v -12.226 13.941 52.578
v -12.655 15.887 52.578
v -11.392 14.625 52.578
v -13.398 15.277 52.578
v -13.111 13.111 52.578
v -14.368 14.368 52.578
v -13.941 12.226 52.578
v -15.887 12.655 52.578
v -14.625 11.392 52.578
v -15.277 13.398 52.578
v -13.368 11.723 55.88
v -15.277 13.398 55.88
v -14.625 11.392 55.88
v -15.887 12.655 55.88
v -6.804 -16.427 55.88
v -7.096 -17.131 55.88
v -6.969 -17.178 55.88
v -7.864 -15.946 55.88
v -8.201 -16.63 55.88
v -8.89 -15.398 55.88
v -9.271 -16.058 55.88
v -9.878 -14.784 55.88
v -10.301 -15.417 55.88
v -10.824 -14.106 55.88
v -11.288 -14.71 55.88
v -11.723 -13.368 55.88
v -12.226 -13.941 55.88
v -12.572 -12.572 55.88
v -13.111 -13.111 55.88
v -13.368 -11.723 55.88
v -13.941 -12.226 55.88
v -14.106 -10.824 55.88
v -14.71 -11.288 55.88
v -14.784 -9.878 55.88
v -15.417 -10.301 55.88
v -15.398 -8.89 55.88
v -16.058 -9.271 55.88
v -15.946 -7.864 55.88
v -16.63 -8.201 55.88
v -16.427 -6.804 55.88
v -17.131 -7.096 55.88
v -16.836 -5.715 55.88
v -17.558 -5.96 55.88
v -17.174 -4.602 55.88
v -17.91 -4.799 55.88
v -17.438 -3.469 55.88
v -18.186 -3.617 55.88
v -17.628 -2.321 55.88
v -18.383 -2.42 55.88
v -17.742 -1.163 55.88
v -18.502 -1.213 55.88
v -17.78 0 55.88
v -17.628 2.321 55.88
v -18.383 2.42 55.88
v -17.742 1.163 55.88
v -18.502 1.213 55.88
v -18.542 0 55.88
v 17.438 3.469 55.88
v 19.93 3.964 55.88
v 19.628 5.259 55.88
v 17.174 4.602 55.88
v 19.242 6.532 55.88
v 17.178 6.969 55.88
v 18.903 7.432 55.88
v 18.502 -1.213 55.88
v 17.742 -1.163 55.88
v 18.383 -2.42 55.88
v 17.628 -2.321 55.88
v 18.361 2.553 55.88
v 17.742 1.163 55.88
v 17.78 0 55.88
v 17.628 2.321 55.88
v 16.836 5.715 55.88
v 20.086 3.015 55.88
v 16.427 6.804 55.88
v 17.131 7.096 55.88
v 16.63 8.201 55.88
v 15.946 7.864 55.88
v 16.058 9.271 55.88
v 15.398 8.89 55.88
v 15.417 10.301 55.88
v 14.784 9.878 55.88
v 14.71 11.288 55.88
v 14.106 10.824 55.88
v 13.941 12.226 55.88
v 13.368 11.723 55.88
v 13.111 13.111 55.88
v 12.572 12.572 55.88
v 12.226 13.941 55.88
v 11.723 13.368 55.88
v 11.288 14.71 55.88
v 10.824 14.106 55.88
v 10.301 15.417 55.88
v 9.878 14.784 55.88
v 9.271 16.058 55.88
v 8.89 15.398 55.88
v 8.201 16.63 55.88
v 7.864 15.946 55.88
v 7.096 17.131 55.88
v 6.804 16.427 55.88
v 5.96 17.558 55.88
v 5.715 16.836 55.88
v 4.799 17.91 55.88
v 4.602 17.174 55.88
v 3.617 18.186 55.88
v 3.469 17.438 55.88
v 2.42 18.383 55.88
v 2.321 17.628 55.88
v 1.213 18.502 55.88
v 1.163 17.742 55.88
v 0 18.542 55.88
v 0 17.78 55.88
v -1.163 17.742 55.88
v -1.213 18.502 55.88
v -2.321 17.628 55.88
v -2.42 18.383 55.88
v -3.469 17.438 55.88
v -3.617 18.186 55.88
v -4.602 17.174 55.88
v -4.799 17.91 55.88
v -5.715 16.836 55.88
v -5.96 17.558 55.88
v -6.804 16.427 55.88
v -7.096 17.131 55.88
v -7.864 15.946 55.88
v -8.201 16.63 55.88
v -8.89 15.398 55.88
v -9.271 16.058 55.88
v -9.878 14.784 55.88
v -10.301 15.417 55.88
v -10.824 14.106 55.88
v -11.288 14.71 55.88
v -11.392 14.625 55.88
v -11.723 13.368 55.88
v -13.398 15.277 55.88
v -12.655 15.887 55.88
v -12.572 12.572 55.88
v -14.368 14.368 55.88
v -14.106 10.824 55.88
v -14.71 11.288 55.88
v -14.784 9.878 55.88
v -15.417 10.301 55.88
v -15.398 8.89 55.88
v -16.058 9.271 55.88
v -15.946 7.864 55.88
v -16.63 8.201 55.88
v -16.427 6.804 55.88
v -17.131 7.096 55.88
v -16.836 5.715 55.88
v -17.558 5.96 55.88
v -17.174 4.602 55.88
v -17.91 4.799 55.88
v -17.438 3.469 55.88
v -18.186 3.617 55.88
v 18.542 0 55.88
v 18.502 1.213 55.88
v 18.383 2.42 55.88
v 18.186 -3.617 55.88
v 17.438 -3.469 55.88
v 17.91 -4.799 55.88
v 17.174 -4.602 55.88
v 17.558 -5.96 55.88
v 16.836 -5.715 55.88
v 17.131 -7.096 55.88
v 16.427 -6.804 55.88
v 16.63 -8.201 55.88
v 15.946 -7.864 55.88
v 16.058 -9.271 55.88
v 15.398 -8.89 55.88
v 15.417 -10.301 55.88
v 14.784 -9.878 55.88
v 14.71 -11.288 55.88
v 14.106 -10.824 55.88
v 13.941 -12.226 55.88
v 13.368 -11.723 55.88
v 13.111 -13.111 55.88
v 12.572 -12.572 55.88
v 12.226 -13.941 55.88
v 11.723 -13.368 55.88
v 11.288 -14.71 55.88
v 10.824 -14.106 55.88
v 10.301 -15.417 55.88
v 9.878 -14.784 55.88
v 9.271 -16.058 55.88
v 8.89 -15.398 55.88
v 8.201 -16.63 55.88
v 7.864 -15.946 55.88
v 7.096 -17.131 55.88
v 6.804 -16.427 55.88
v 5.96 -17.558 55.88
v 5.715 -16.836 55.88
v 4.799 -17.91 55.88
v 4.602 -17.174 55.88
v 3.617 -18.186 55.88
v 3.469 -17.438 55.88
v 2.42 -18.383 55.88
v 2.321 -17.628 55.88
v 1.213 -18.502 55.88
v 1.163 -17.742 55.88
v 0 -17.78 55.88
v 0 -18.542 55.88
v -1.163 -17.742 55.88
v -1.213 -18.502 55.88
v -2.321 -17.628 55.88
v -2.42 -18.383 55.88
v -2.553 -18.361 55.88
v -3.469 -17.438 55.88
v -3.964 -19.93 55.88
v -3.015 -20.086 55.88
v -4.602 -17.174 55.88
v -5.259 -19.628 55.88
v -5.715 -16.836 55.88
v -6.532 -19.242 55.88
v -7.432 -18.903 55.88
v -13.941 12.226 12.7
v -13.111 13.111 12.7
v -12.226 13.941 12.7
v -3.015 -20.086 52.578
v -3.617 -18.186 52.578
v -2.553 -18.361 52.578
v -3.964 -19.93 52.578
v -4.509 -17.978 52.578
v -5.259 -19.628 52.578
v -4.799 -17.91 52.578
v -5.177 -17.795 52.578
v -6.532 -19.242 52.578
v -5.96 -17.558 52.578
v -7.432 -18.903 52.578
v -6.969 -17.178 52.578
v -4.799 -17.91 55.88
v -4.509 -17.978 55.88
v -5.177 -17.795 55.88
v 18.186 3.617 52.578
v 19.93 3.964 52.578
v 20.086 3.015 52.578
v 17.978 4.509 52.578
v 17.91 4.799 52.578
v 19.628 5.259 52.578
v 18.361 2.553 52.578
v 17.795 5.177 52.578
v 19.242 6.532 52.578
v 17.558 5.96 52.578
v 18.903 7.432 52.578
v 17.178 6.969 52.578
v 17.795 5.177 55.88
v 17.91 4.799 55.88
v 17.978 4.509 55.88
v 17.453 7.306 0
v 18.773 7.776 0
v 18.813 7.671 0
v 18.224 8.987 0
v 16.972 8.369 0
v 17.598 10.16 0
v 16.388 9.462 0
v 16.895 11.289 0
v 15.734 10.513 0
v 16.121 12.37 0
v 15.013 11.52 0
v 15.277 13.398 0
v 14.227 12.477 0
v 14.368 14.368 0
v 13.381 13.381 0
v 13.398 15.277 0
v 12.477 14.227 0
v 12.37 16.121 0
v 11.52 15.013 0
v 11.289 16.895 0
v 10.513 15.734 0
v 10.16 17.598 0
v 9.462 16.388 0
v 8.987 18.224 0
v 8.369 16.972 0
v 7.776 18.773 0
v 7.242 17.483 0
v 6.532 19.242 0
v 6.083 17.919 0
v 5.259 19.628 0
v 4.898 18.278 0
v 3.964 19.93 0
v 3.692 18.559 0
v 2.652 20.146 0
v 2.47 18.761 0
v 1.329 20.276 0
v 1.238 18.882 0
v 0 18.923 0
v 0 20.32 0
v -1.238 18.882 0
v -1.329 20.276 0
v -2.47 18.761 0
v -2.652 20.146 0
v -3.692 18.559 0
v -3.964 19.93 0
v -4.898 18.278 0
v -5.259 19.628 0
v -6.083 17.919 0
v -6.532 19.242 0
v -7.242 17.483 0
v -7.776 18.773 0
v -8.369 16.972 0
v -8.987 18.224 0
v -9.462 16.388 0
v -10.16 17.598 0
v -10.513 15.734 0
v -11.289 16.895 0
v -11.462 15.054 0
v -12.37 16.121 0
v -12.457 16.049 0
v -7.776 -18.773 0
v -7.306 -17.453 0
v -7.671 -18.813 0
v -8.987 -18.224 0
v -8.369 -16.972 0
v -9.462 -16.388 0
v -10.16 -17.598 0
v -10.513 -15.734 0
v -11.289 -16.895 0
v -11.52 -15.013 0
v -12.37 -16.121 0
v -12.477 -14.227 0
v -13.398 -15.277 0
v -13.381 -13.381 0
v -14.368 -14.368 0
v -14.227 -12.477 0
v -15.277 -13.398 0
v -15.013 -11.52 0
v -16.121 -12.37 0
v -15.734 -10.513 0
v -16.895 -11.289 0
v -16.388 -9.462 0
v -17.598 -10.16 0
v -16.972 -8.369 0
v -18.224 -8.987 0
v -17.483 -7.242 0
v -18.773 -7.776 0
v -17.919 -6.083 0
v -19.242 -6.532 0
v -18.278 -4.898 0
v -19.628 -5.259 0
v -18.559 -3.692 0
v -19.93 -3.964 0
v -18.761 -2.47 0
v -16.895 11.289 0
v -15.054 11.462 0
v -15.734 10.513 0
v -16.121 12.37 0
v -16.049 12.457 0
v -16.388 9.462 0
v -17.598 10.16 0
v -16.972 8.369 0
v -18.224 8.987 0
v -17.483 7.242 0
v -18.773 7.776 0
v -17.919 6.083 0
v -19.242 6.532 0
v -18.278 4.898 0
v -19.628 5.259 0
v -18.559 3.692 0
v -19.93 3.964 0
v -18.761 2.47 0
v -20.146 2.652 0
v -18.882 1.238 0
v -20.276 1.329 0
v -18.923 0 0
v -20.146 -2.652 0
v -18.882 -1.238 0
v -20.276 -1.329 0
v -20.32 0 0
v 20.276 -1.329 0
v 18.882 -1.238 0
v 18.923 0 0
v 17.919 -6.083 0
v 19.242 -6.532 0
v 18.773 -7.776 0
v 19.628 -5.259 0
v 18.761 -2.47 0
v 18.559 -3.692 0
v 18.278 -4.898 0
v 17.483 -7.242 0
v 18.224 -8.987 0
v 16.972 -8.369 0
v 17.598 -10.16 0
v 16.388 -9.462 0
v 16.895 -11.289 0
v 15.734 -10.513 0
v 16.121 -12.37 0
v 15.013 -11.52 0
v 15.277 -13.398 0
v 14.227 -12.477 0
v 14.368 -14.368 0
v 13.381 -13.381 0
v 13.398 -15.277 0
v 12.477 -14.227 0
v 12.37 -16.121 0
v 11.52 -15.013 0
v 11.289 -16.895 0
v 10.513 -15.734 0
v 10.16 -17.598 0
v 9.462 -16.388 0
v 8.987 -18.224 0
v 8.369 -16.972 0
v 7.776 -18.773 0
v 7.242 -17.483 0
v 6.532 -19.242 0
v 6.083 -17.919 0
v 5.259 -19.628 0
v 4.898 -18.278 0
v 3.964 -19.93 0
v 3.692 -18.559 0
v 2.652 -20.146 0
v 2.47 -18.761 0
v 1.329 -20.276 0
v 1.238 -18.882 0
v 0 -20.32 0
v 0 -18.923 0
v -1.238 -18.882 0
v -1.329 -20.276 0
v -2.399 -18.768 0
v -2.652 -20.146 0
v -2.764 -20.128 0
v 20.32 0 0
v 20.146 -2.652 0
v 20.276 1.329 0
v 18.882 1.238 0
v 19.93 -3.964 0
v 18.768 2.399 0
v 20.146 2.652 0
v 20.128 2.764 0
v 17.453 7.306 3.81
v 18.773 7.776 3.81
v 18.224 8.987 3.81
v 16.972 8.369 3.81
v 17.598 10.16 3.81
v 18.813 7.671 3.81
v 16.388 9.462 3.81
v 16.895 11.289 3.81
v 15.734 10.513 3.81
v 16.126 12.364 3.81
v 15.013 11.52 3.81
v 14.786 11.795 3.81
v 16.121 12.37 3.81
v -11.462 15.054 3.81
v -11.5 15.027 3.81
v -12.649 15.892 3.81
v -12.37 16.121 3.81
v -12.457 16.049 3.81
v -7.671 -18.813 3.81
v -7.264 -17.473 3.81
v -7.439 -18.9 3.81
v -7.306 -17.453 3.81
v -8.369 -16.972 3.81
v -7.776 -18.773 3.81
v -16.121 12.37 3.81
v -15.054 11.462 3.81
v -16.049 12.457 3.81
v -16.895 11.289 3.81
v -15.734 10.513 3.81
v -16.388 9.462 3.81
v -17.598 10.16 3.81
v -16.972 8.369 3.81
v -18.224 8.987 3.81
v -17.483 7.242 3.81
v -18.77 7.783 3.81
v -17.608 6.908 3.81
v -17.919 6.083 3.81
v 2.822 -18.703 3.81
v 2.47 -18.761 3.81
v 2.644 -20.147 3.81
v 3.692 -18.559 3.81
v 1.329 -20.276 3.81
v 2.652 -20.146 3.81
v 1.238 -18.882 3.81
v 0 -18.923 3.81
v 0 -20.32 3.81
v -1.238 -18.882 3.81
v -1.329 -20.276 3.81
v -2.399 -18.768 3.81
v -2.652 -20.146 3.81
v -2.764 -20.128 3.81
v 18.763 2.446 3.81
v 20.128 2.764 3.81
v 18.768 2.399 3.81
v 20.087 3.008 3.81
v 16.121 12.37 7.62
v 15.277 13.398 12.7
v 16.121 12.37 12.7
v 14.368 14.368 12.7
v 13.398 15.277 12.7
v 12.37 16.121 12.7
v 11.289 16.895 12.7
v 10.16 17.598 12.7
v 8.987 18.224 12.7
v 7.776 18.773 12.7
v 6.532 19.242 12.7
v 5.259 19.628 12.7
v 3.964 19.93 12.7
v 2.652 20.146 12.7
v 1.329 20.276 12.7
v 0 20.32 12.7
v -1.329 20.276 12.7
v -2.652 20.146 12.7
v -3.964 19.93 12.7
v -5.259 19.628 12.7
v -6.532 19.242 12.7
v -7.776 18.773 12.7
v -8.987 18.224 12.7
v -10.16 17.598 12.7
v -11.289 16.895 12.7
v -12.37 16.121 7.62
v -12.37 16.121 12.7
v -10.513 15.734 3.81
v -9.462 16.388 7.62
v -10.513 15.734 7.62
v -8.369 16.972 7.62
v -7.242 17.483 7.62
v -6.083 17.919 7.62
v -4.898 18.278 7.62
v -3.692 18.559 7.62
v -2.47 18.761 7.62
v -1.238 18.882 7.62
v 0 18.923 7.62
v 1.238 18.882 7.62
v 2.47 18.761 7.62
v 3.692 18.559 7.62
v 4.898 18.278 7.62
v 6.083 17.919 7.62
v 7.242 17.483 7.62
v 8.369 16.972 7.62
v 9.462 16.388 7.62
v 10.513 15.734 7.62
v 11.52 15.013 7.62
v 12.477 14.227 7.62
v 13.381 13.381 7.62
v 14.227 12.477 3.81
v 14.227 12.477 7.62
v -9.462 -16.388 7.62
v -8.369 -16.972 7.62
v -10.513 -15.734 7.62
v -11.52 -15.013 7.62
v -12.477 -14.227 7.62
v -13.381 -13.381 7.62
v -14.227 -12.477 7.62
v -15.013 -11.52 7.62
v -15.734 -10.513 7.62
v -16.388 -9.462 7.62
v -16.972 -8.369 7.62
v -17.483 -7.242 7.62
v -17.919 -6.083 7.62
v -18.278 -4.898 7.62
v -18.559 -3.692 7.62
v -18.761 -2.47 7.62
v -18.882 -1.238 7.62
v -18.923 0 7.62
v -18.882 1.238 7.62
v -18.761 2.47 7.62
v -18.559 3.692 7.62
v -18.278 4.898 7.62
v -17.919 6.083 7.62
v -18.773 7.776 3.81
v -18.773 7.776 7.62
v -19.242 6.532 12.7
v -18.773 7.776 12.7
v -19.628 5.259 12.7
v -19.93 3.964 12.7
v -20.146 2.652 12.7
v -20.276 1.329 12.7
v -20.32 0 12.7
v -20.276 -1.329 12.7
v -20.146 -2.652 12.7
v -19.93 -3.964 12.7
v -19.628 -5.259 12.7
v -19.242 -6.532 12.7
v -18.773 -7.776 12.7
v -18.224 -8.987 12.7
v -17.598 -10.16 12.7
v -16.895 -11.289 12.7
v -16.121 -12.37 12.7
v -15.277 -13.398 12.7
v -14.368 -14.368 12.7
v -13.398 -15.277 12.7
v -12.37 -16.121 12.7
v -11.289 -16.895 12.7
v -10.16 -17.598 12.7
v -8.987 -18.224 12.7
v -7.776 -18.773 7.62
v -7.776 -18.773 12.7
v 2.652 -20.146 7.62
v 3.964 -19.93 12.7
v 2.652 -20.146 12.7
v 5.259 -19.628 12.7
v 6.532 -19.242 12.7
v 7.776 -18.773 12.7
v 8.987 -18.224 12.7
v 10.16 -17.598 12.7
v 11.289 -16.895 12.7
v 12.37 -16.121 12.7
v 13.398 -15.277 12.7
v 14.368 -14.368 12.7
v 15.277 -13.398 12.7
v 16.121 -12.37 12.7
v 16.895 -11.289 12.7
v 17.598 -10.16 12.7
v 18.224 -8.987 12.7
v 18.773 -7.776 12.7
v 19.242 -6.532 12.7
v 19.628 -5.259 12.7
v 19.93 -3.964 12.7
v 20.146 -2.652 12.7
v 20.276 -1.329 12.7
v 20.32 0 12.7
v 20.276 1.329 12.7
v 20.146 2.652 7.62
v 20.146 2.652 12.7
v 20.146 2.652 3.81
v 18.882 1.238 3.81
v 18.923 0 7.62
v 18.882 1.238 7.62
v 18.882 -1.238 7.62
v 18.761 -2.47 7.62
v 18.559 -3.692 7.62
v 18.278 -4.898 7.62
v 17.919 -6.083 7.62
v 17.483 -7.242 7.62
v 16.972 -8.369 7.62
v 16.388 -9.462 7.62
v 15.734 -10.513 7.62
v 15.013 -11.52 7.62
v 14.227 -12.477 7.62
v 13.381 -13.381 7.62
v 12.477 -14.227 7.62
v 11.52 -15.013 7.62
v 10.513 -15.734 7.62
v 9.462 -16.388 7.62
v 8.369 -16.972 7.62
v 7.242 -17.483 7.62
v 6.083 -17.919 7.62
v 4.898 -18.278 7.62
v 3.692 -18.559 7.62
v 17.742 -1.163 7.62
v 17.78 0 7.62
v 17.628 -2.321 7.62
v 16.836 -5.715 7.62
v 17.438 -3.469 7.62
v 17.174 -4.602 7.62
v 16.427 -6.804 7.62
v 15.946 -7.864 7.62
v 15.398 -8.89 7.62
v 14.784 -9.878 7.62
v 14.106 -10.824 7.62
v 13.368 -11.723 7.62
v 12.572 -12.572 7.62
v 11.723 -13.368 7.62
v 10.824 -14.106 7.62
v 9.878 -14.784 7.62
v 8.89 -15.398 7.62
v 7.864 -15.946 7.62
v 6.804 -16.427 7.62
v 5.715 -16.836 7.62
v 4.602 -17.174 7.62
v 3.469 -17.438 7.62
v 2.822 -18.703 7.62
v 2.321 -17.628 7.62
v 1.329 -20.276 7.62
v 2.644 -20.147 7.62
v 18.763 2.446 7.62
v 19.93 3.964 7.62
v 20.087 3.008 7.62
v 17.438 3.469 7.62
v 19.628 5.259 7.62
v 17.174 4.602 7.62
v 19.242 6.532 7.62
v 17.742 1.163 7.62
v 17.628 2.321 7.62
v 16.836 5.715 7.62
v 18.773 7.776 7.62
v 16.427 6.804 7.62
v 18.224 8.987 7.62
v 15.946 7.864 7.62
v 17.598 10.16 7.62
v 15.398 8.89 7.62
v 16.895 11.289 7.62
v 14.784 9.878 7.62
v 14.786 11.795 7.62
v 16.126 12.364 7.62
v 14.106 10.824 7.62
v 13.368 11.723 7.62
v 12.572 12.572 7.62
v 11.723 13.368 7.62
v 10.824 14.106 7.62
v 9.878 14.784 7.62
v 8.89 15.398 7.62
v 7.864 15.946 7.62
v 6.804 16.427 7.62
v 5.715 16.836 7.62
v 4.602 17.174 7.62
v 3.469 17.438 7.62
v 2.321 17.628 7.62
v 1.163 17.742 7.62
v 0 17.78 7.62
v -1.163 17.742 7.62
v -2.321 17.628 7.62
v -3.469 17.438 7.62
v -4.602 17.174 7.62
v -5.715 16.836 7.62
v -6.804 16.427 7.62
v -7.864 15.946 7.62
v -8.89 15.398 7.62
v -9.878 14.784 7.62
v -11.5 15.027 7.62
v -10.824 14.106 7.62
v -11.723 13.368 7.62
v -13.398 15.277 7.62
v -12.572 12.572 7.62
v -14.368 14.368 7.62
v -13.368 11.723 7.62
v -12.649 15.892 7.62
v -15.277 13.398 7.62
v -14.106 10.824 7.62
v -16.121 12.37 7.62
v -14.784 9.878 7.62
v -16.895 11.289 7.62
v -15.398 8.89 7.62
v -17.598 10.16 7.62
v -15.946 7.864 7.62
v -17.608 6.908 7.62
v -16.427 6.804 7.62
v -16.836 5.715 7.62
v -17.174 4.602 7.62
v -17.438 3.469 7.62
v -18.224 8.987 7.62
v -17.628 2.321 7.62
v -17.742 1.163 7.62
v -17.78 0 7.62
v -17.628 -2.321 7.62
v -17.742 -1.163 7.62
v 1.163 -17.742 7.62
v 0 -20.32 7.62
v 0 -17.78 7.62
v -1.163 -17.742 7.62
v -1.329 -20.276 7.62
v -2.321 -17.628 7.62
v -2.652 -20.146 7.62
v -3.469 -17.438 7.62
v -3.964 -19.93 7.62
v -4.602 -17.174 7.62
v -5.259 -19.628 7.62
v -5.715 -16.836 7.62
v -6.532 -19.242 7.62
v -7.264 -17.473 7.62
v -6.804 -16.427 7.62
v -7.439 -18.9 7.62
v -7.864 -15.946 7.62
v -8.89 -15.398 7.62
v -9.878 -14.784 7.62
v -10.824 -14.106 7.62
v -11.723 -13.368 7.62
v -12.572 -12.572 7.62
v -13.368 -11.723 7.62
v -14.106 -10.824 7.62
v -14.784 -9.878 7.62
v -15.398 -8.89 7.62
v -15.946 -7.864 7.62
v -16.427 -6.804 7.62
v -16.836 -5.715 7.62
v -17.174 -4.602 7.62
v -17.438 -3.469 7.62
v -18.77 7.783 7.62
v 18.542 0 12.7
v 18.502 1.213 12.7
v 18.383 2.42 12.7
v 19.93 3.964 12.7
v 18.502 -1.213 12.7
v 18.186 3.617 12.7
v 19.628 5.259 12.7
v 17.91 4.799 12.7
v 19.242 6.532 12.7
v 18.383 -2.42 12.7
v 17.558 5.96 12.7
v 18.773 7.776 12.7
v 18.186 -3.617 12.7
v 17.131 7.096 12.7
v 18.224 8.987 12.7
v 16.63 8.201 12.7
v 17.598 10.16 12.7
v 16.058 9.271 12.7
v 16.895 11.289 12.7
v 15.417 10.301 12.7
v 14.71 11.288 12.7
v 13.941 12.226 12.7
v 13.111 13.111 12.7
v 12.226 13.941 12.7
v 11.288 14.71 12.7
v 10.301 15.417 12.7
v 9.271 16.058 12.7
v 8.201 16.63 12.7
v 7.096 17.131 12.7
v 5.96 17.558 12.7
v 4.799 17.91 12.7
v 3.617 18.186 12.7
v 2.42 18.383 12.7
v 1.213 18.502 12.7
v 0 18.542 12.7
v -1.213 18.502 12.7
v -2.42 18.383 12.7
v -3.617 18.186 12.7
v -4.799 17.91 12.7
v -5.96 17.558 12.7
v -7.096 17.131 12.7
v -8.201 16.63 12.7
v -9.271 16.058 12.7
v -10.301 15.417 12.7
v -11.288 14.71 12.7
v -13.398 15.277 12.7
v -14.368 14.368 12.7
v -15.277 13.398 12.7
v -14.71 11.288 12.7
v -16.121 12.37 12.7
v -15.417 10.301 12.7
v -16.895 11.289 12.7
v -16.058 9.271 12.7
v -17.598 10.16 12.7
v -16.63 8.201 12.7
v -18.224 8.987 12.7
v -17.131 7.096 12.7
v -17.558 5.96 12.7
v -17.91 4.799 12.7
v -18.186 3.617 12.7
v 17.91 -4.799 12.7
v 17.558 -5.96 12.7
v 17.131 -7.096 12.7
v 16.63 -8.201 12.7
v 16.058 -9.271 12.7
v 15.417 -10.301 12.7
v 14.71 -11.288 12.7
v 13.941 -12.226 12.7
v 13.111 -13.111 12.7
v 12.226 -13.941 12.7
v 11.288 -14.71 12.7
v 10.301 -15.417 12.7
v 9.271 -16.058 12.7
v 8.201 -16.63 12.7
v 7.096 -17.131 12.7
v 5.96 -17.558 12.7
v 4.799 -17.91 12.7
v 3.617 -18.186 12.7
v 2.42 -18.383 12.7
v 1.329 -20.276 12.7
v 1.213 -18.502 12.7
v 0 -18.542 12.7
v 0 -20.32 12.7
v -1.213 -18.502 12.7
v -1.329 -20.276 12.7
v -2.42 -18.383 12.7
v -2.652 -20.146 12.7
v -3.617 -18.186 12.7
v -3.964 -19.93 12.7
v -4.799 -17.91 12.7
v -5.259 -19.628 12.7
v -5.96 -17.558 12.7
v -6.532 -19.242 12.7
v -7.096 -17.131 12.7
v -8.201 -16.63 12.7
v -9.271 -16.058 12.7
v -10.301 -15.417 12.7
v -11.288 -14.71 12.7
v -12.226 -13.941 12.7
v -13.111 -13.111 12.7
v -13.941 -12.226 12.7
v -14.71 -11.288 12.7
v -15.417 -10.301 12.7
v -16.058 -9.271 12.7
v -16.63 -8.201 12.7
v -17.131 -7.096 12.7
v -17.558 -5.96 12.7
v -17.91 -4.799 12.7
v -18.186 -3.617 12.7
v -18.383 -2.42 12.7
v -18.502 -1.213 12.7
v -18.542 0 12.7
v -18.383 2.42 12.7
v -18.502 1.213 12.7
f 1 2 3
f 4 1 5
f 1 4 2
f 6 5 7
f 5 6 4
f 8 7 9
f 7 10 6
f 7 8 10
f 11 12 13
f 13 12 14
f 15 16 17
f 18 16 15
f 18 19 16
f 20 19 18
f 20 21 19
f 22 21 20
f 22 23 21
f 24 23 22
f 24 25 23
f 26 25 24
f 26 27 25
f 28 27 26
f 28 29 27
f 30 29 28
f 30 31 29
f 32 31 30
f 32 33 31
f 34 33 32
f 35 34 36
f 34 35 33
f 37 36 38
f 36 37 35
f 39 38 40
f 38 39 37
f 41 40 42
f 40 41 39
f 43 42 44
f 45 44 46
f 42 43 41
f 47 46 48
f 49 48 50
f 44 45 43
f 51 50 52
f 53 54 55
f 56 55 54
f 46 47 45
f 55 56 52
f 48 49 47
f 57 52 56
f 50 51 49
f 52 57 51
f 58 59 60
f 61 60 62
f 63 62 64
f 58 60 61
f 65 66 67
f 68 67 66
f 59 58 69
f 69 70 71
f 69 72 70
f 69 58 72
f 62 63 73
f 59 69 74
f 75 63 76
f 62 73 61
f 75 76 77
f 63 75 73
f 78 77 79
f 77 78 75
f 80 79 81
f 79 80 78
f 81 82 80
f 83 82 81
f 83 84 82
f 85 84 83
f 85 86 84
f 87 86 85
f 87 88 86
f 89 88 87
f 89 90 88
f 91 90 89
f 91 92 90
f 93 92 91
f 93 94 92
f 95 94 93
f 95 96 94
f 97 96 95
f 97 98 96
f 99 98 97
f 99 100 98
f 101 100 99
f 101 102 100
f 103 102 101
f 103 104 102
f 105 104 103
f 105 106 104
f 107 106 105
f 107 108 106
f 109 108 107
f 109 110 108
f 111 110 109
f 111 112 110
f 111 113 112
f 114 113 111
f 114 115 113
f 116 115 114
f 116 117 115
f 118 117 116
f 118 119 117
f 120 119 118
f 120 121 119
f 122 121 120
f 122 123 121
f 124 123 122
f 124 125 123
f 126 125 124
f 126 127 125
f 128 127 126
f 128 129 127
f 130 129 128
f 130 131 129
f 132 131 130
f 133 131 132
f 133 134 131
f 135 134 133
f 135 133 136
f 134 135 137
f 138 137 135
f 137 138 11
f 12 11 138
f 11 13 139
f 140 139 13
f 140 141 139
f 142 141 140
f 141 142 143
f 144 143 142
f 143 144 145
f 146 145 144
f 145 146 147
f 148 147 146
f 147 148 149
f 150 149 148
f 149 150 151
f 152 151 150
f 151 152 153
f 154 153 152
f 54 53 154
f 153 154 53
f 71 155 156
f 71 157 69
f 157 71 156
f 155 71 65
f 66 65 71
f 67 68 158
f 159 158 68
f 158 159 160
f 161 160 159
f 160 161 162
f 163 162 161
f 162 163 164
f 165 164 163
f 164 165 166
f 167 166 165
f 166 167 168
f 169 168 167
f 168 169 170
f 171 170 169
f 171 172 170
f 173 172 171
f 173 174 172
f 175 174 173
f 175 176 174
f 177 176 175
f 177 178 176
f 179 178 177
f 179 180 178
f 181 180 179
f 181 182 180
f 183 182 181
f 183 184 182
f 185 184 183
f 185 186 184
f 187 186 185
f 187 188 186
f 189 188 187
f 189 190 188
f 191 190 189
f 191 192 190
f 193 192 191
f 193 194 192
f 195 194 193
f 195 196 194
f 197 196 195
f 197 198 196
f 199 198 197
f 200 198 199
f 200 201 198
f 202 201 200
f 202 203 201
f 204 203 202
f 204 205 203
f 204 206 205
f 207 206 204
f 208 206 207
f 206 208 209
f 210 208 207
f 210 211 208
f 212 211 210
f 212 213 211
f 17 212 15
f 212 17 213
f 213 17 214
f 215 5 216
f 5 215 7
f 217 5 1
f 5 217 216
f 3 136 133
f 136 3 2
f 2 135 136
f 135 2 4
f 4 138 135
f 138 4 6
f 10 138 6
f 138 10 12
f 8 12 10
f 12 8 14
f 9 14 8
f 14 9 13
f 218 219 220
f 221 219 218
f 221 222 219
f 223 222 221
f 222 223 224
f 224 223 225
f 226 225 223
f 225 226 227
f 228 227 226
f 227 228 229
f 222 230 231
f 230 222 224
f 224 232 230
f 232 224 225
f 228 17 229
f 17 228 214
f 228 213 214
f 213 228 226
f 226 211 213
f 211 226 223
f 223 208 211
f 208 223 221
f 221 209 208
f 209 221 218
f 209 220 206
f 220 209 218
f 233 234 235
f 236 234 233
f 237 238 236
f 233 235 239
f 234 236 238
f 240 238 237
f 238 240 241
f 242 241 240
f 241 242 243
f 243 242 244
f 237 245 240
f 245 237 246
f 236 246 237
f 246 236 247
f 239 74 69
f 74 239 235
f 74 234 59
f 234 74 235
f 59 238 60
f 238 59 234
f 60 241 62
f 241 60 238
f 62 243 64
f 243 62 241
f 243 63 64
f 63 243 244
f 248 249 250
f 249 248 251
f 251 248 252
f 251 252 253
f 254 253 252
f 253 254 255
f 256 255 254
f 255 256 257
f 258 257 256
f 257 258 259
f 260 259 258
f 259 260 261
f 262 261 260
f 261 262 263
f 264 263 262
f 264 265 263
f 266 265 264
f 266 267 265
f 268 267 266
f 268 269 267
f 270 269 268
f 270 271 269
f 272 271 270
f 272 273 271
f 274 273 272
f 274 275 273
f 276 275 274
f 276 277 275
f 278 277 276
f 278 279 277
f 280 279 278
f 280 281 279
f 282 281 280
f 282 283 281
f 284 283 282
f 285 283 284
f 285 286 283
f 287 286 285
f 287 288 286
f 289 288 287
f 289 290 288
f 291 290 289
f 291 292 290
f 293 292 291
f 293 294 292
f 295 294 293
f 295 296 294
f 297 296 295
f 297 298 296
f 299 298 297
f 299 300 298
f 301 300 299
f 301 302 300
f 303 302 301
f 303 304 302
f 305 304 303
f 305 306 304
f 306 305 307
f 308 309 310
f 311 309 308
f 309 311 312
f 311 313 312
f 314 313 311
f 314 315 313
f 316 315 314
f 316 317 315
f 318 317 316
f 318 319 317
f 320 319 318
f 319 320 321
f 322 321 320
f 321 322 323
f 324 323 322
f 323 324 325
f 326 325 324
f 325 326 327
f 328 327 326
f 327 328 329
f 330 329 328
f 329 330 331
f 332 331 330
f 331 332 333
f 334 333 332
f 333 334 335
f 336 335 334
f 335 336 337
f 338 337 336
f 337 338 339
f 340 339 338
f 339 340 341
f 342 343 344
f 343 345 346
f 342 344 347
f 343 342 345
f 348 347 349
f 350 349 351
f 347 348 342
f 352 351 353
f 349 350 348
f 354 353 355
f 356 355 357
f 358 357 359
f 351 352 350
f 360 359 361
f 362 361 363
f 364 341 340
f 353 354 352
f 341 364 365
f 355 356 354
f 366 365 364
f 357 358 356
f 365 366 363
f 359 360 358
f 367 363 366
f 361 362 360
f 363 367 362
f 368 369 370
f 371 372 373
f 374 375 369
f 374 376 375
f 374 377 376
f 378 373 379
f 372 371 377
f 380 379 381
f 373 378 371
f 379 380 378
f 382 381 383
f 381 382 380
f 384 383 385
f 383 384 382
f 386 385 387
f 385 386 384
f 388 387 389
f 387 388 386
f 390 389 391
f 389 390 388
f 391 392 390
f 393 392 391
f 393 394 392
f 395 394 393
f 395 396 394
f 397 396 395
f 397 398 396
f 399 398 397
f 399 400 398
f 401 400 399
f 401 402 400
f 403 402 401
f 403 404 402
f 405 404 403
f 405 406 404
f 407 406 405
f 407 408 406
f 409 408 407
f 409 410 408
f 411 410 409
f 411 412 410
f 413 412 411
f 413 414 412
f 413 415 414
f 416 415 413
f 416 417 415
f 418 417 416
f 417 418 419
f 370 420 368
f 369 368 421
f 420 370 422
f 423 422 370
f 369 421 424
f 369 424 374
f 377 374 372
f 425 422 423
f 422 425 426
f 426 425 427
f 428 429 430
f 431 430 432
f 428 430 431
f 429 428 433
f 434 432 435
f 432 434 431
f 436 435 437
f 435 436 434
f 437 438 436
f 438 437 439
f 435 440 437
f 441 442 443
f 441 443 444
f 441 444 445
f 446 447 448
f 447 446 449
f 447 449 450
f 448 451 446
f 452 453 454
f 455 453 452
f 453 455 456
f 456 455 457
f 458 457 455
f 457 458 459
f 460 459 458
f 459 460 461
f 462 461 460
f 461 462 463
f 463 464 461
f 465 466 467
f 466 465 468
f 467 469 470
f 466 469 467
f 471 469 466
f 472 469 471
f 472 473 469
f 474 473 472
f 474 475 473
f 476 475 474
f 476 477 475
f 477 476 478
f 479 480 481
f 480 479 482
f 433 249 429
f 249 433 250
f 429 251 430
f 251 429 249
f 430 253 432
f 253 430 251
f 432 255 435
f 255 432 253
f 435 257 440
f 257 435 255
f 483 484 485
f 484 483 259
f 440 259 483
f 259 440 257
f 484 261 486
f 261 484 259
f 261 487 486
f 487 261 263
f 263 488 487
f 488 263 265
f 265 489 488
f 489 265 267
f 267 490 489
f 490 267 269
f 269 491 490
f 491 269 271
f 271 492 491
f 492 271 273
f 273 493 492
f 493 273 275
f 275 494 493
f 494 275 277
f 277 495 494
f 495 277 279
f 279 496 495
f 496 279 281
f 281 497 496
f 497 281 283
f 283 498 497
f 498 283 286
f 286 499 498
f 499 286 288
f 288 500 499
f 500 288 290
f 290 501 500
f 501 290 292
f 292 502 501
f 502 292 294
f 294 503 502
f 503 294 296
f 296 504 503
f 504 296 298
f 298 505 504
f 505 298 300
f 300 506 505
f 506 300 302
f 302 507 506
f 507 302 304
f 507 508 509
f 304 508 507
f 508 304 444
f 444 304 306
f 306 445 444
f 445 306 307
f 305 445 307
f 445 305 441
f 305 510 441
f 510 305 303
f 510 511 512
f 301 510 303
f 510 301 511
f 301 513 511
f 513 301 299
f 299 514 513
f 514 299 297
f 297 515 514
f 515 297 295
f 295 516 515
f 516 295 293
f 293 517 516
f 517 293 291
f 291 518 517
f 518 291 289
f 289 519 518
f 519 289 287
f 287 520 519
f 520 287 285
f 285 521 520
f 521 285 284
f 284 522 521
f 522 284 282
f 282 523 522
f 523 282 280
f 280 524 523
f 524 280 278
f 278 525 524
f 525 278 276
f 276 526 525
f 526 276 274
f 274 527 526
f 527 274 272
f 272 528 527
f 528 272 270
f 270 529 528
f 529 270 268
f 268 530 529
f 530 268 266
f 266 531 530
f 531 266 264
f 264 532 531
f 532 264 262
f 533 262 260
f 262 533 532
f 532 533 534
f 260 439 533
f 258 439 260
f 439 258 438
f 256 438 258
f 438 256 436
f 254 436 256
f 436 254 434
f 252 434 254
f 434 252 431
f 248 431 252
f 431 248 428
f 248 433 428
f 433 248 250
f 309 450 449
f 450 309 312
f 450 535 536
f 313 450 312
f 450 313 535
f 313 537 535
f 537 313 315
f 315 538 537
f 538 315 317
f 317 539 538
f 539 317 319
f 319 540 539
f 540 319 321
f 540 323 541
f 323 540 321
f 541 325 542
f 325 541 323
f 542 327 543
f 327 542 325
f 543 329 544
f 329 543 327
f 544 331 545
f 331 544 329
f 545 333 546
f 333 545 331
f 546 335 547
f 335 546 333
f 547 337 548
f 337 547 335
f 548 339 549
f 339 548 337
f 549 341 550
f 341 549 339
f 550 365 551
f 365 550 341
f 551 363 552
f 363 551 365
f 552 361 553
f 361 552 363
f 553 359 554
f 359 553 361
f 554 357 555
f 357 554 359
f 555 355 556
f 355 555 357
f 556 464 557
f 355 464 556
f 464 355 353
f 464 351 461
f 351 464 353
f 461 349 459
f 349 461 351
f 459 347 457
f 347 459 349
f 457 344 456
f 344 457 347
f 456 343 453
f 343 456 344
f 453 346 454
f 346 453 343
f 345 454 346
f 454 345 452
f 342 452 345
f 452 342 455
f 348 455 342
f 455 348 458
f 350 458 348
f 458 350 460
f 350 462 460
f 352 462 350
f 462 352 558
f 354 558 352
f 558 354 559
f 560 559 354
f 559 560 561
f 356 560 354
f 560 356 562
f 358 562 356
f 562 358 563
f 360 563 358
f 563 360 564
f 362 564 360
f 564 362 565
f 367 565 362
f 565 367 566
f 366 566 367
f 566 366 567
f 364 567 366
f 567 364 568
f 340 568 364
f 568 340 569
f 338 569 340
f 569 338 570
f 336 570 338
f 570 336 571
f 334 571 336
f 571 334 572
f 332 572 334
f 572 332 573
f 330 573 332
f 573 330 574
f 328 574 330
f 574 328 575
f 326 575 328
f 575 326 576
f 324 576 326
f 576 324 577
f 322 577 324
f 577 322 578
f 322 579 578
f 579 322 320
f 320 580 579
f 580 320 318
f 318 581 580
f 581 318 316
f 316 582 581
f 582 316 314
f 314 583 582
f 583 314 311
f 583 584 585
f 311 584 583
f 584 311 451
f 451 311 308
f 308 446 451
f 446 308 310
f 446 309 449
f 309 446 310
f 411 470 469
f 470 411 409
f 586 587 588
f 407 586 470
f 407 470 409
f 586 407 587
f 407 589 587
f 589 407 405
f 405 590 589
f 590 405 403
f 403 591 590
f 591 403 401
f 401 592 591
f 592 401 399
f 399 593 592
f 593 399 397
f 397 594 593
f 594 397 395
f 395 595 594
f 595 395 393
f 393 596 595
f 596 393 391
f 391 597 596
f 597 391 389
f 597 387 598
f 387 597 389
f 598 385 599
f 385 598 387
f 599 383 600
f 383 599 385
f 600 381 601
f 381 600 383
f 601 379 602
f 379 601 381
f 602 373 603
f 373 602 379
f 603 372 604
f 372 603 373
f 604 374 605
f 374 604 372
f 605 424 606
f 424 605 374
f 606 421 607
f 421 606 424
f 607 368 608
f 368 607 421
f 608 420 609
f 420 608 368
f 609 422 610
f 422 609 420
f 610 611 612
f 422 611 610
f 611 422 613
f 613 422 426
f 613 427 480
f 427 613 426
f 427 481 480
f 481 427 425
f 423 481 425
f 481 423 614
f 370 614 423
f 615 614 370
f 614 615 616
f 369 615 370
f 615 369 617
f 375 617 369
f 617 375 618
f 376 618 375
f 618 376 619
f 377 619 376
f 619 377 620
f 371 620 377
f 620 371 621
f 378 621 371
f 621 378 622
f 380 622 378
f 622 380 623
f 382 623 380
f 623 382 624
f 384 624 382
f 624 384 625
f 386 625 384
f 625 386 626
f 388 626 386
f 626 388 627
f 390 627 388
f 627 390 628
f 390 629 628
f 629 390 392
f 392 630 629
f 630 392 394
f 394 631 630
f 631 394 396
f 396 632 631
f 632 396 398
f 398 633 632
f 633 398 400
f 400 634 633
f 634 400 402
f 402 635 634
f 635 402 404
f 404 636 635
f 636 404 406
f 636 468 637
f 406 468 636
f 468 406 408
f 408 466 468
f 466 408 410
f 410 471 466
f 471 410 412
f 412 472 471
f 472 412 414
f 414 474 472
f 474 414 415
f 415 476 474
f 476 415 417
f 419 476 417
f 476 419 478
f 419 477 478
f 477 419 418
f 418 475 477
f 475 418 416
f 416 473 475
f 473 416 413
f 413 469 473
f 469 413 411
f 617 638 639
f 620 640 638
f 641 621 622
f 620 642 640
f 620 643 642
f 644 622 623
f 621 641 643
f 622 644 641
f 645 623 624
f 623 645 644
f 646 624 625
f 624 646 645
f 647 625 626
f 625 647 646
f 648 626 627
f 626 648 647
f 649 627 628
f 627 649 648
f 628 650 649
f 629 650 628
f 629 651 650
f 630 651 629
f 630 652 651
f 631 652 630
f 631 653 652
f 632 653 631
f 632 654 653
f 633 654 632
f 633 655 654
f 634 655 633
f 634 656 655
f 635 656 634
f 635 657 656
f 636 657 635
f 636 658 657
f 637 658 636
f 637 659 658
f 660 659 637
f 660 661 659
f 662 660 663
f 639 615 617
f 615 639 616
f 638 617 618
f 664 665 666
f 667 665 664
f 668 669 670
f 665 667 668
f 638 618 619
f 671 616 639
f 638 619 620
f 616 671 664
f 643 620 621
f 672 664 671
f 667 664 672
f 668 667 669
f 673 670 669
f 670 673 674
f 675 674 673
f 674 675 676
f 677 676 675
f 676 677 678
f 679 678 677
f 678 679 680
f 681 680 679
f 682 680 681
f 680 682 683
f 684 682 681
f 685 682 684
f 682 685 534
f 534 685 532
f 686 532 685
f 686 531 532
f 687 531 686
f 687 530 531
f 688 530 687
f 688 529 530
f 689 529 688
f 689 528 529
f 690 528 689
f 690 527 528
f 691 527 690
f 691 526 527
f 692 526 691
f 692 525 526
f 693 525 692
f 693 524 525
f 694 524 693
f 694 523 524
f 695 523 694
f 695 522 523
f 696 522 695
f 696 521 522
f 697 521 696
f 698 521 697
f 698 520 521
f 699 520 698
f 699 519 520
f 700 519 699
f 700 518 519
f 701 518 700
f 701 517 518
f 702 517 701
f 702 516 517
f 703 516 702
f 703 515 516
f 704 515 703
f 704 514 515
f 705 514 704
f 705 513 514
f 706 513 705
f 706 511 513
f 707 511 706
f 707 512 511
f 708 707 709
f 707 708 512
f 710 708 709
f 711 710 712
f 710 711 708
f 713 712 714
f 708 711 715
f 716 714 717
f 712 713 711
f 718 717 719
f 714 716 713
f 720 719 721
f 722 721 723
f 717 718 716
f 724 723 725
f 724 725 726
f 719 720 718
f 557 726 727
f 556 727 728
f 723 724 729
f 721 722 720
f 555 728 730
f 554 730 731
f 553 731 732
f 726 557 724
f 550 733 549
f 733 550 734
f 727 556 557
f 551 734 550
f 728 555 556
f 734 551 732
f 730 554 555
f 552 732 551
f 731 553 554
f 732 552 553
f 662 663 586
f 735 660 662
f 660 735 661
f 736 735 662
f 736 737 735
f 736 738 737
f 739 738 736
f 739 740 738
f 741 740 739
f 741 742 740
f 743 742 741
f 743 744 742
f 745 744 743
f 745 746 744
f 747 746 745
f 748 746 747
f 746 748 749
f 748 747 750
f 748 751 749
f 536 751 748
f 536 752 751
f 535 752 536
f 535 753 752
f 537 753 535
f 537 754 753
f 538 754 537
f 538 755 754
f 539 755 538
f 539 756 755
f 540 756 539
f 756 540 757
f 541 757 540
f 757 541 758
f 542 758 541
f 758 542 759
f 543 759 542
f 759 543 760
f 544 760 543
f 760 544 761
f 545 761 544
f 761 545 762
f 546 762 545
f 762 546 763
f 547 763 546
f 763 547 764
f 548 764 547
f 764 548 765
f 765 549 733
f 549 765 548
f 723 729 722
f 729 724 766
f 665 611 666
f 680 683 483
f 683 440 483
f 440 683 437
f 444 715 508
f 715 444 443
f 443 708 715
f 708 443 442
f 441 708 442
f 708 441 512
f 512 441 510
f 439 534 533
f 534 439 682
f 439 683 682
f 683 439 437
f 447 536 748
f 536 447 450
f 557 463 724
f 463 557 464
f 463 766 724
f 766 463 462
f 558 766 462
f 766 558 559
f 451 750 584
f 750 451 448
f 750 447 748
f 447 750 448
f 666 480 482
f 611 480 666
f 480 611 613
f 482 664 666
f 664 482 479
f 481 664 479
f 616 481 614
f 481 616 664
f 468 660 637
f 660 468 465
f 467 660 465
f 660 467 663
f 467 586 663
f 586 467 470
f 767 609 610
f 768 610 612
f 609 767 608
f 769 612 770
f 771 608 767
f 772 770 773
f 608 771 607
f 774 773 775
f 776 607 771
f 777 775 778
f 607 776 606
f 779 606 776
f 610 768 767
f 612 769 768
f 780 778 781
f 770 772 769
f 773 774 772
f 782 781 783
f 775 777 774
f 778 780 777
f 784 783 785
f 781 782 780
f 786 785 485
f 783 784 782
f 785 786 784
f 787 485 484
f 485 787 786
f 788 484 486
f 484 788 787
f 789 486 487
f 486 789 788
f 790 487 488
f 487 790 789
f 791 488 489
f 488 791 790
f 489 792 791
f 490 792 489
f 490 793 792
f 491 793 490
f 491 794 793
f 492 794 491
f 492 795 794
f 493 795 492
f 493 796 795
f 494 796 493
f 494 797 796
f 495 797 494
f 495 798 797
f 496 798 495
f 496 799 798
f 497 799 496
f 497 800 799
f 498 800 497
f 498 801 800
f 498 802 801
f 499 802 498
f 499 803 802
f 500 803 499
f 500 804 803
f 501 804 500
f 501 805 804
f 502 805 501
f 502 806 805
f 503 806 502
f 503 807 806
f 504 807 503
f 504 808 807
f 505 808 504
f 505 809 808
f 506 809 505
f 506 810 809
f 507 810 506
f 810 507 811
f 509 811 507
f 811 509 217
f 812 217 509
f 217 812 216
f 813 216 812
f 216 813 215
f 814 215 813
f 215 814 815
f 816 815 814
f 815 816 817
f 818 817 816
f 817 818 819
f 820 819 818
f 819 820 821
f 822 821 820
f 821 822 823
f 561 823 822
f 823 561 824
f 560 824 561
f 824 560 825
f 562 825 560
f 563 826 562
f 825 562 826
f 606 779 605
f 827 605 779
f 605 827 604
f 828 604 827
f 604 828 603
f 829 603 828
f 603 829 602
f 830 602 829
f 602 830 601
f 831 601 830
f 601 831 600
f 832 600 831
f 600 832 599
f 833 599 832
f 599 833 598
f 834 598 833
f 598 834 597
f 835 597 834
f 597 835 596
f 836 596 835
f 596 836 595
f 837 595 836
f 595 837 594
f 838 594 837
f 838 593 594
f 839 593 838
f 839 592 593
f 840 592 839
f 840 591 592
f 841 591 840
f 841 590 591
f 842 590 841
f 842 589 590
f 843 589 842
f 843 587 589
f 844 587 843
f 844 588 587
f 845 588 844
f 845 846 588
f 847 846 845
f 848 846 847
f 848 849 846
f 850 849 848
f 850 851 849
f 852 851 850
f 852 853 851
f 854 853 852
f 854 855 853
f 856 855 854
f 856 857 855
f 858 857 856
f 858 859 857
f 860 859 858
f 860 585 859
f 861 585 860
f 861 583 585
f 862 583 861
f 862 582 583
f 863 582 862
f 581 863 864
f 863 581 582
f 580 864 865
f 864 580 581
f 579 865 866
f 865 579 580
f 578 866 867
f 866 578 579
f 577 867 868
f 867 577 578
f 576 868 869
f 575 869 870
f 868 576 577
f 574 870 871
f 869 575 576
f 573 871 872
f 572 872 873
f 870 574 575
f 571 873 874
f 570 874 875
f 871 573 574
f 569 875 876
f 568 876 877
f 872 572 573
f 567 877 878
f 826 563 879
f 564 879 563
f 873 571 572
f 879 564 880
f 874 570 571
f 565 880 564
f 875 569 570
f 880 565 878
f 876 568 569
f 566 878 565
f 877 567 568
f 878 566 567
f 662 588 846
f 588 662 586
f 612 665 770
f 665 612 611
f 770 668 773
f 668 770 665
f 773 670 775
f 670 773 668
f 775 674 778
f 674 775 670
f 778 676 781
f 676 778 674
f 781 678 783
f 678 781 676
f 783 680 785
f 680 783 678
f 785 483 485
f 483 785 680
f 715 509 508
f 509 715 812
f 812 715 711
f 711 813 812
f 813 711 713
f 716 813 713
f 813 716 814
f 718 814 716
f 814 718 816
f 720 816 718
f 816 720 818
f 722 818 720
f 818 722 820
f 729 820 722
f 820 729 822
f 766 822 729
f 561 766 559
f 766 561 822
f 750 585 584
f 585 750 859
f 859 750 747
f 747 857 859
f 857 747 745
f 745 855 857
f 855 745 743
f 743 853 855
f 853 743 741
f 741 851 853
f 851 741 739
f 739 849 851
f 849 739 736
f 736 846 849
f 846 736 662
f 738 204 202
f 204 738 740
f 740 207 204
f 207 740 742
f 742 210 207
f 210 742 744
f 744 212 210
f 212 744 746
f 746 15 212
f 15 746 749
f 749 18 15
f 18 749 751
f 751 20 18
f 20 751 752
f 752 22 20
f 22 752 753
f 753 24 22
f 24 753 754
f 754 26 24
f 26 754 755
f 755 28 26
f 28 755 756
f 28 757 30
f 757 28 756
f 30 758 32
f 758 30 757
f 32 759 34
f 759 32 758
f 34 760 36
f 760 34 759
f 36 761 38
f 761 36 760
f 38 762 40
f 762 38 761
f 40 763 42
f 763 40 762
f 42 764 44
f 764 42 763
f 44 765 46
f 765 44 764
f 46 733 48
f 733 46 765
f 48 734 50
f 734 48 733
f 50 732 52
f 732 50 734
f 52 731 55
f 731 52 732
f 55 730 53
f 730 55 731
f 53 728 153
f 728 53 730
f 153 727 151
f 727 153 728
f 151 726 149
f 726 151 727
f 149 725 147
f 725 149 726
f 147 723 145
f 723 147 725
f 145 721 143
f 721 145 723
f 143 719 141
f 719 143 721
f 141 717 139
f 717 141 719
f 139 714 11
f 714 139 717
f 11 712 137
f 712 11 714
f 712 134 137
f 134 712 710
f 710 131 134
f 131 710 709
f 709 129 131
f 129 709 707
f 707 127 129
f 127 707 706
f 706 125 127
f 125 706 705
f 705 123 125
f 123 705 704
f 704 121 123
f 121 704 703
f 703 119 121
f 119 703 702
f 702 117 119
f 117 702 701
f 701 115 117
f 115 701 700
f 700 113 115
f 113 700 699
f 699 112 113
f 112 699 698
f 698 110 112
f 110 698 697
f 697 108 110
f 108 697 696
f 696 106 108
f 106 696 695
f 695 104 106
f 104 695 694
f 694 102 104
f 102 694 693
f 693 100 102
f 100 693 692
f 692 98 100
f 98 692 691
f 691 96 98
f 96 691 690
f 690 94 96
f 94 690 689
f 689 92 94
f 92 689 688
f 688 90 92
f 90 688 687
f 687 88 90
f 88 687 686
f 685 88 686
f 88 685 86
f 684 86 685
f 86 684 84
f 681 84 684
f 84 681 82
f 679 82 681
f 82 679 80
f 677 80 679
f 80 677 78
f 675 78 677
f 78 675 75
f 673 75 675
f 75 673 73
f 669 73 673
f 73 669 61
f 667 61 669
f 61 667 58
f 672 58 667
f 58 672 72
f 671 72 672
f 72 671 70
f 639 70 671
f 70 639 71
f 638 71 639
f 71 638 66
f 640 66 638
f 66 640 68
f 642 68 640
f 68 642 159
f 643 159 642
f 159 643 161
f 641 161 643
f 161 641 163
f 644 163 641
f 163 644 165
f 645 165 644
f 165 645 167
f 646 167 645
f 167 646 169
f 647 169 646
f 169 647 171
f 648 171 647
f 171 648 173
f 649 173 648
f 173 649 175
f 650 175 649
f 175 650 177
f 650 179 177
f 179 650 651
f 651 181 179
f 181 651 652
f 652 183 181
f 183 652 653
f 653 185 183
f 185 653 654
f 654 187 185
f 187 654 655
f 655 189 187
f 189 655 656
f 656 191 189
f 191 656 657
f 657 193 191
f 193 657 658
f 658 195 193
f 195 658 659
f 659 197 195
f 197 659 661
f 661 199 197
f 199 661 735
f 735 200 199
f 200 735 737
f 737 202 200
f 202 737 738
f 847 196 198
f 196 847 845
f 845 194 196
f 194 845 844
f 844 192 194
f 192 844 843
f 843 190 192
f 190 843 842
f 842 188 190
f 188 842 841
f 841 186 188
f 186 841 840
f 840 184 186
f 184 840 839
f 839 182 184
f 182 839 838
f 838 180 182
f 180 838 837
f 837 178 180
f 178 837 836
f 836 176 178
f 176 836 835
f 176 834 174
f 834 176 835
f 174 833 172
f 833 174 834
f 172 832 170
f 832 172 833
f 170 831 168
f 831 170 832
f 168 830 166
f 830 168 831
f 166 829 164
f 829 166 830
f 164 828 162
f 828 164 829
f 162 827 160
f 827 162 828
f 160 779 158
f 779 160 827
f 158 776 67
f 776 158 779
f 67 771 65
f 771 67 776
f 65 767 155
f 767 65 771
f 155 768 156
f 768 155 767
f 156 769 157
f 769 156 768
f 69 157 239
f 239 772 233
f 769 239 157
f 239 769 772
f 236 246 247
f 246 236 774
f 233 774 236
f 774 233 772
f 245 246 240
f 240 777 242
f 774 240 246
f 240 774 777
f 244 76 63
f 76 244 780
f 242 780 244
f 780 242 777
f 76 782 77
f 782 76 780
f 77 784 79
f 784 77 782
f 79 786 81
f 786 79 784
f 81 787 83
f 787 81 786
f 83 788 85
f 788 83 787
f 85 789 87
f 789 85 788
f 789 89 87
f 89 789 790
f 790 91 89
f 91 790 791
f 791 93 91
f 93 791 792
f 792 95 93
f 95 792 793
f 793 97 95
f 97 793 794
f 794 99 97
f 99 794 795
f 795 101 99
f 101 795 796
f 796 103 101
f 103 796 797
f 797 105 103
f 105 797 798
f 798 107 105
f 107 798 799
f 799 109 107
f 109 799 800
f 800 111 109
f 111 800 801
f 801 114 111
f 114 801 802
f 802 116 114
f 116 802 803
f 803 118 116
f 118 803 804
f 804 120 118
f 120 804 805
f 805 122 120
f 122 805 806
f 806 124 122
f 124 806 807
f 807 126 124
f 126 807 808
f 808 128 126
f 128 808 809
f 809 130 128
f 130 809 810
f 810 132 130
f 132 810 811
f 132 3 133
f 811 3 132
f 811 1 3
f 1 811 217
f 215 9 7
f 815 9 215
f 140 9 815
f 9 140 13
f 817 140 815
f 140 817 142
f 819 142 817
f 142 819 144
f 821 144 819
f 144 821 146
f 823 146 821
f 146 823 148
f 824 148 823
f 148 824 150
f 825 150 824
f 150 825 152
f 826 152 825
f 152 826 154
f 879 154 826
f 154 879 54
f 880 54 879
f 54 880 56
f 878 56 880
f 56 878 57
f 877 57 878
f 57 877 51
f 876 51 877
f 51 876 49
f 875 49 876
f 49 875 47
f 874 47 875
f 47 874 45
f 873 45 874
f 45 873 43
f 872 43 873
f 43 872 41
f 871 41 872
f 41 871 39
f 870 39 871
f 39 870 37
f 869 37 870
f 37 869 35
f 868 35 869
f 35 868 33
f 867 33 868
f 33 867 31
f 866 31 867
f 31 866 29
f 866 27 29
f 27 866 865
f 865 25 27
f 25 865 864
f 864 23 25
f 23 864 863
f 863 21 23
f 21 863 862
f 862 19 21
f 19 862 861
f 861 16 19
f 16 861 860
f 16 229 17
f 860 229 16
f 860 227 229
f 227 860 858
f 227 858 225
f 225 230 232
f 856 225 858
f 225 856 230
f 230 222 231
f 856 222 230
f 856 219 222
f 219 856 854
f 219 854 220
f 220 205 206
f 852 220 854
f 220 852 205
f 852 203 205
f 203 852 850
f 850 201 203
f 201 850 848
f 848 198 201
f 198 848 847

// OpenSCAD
ViewScale = [0.0254, 0.0254, 0.0254];

module cutouts()
{
   difference() {
        circle(1600/2, $fn=96);
        circle(1490/2, $fn=96);
        // tab
        rotate([0, 0, 45]) 
        translate([0, 700, 0])
        square([200, 200], center=true);
        // tab
        rotate([0, 0, 165]) 
        translate([0, 700, 0])
        square([200, 200], center=true);
        // tab
        rotate([0, 0, 285]) 
        translate([0, 700, 0])
        square([200, 200], center=true);
    }
}

module cutouts2()
{
   difference() {
        circle(1600/2, $fn=96);
        circle(1490/2, $fn=96);
        // tab
        rotate([0, 0, 53]) 
        translate([0, 700, 0])
        square([400, 200], center=true);
        // tab
        rotate([0, 0, 173]) 
        translate([0, 700, 0])
        square([400, 200], center=true);
        // tab
        //#rotate([0, 0, 240]) 
        rotate([0, 0, 293]) 
        translate([0, 700, 0])
        square([400, 200], center=true);
    }
}

module body1()
{
    difference() {
        circle(1600/2, $fn=96);
        circle(1400/2, $fn=96);
    }
}

//module bodycutout()
//{
//    difference() {
//        circle(1460/2, $fn=96);
//        circle(1360/2, $fn=96);
//        *square([1020, 1020], center=true);
//        translate([0, 700, 0])
//        square([400, 200], center=true);
//        scale([1.3,1.3,1.3])
//        translate([0, 500, 0])
//        square([400, 200], center=true);
//        //rotcutouts();
//    }
//}

//module bodycutout2()
//{
//    difference() {
//        circle(1460/2, $fn=96);
//        circle(1360/2, $fn=96);
//        scale([1.3,1.3,1.3])
//        translate([0, 500, 0])
//        square([400, 200], center=true);
//        //rotcutouts();
//    }
//}

//module ledframe2()
//{
//    difference() {
//    square([1030, 1030], center=true);
//    square([800, 800], center=true);
//    rotcutouts();
////    translate([0, 500, 0])
////    square([400, 200], center=true);
//    }
//}
//
//module ledframe1()
//{
//    difference() {
//        square([1030, 1030], center=true);
//        square([900, 900], center=true);
//        rotcutouts();
//    }
//}

//module support()
//{
//    difference() {
//    square([860, 860], center=true);
//    square([760, 760], center=true);
//    }
//}

//module mirror()
//{
//    translate([-525/2, 0, 500])
//    rotate([135, 0, 0]) {
//        translate([-10, 0, -500]) {
//        linear_extrude(1000)
//        difference() {
//            square([545, 164]);
//            translate([94/2, 0, 0])
//            square([445, 114]);
//        }
//        translate([0, 0, 1000])
//        linear_extrude(50)
//        square([525, 164]);
//    }}
//}
//
//module cap() 
//{
//    difference() {
//        circle(1600/2, $fn=96);
//        square([455, 870], center=true);
//    }
//}

//module vexmount1()
//{
//    difference() {
//        hull() {
//            circle(380/2);
//            translate([820, 0, 0])
//            square([380, 380], center=true);
//        }
//        circle(200/2);
//    }
//}


//module vexmount()
//{
//    linear_extrude(150) {
//        vexmount1();
//        translate([2000, 0, 0])
//        rotate([0, 180, 0])
//        vexmount1();
//    }
//}

//module mountsupport()
//{
//    difference() {
//        translate([0, 650, 0])
//        square([1500, 200], center=true);
//        circle(1600/2, $fn=96);
//    }
//}

module mirrormountgrooves()
{
    difference() {
        difference() {
            circle(1820/2, $fn=96);
            circle(1620/2, $fn=96);
        }
        for(ii=[30:30:360])
        {
            rotate([0, 0, ii])
            translate([850, 0, 0])
            square([200, 300], center=true);
        }
    }
}

module mirrormounttabs()
{
    intersection() {
    difference() {
        circle(1800/2, $fn=96);
        circle(1600/2, $fn=96);
    }
    for(ii=[30:120:270]){
        rotate([0, 0, ii])
        translate([880, 0, 0])
        square([200, 280], center=true);
    }}
}


module tab()
{
    // tab big bit
    *linear_extrude(160)
    intersection() {
        difference() {
            circle(1660/2, $fn=96);
            circle(1460/2, $fn=96);
        }
        rotate([0, 0, 52]) 
        translate([0, 700, 0])
        square([380, 260], center=true);
    }
    //translate([0, 0, 160])
    // tab little bit
    linear_extrude(130)
    intersection() {
        difference() {
            circle(1600/2, $fn=96);
            circle(1460/2, $fn=96);
        }
        rotate([0, 0, 45]) 
        translate([0, 700, 0])
        square([180, 300], center=true);
    }
}

module tabs()
{
    tab();
    rotate([0, 0, 120])
    tab();
    rotate([0, 0, 240])
    tab();
}

module tabcoupling()
{
    translate([0, 0, 0])
    linear_extrude(150)
    cutouts();

    translate([0, 0, 150])
    linear_extrude(150)
    cutouts2();

    translate([0, 0, 300])
    linear_extrude(200)
    body1();

    translate([0, 0, 500])
    linear_extrude(1700)
    difference() {
        circle(1460/2, $fn=96);
        circle(1400/2, $fn=96);
    }

    translate([0, 0, 2070])
    tabs();
}

//module tabbedlensmount() 
//{
//    // base
//    linear_extrude(1000)
//    difference() {
//        circle(1460/2, $fn=96);
//        circle(1360/2, $fn=96);
//    }
//
//    // support1
//    *linear_extrude(970)
//    difference() {
//        circle(1330/2, $fn=96);
//        circle(1180/2, $fn=96);
//    }
//
//    // support2
//    *linear_extrude(970)
//    difference() {
//        circle(1150/2, $fn=96);
//        circle(1000/2, $fn=96);
//    }
//
//    *translate([0, 0, 1000])
//    linear_extrude(50)
//    difference() {
//        circle(1460/2, $fn=96);
//        circle(1010/2, $fn=96);
//    }
//
//    *translate([0, 0, 1050])
//    linear_extrude(300) {
//        difference() {
//            circle(1110/2, $fn=96);
//            circle(1010/2, $fn=96);
//        }
//    }
//    translate([0, 0, 10])
//    tabs();
//}

//module adjvexmount()
//{
//    translate([-1000, 890, 190])
//    rotate([-90, 0, 0])
//    vexmount();
//
//    translate([0, 140, 0])
//    linear_extrude(380)
//    mountsupport();
//
//    linear_extrude(1000)
//    difference() {
//        circle(2050/2, $fn=96);
//        circle(1820/2, $fn=96);
//        mirrormountgrooves();
//    }
//    linear_extrude(1000)
//    mirrormountgrooves();
//}

scale(ViewScale)
{
    tabcoupling();
}
